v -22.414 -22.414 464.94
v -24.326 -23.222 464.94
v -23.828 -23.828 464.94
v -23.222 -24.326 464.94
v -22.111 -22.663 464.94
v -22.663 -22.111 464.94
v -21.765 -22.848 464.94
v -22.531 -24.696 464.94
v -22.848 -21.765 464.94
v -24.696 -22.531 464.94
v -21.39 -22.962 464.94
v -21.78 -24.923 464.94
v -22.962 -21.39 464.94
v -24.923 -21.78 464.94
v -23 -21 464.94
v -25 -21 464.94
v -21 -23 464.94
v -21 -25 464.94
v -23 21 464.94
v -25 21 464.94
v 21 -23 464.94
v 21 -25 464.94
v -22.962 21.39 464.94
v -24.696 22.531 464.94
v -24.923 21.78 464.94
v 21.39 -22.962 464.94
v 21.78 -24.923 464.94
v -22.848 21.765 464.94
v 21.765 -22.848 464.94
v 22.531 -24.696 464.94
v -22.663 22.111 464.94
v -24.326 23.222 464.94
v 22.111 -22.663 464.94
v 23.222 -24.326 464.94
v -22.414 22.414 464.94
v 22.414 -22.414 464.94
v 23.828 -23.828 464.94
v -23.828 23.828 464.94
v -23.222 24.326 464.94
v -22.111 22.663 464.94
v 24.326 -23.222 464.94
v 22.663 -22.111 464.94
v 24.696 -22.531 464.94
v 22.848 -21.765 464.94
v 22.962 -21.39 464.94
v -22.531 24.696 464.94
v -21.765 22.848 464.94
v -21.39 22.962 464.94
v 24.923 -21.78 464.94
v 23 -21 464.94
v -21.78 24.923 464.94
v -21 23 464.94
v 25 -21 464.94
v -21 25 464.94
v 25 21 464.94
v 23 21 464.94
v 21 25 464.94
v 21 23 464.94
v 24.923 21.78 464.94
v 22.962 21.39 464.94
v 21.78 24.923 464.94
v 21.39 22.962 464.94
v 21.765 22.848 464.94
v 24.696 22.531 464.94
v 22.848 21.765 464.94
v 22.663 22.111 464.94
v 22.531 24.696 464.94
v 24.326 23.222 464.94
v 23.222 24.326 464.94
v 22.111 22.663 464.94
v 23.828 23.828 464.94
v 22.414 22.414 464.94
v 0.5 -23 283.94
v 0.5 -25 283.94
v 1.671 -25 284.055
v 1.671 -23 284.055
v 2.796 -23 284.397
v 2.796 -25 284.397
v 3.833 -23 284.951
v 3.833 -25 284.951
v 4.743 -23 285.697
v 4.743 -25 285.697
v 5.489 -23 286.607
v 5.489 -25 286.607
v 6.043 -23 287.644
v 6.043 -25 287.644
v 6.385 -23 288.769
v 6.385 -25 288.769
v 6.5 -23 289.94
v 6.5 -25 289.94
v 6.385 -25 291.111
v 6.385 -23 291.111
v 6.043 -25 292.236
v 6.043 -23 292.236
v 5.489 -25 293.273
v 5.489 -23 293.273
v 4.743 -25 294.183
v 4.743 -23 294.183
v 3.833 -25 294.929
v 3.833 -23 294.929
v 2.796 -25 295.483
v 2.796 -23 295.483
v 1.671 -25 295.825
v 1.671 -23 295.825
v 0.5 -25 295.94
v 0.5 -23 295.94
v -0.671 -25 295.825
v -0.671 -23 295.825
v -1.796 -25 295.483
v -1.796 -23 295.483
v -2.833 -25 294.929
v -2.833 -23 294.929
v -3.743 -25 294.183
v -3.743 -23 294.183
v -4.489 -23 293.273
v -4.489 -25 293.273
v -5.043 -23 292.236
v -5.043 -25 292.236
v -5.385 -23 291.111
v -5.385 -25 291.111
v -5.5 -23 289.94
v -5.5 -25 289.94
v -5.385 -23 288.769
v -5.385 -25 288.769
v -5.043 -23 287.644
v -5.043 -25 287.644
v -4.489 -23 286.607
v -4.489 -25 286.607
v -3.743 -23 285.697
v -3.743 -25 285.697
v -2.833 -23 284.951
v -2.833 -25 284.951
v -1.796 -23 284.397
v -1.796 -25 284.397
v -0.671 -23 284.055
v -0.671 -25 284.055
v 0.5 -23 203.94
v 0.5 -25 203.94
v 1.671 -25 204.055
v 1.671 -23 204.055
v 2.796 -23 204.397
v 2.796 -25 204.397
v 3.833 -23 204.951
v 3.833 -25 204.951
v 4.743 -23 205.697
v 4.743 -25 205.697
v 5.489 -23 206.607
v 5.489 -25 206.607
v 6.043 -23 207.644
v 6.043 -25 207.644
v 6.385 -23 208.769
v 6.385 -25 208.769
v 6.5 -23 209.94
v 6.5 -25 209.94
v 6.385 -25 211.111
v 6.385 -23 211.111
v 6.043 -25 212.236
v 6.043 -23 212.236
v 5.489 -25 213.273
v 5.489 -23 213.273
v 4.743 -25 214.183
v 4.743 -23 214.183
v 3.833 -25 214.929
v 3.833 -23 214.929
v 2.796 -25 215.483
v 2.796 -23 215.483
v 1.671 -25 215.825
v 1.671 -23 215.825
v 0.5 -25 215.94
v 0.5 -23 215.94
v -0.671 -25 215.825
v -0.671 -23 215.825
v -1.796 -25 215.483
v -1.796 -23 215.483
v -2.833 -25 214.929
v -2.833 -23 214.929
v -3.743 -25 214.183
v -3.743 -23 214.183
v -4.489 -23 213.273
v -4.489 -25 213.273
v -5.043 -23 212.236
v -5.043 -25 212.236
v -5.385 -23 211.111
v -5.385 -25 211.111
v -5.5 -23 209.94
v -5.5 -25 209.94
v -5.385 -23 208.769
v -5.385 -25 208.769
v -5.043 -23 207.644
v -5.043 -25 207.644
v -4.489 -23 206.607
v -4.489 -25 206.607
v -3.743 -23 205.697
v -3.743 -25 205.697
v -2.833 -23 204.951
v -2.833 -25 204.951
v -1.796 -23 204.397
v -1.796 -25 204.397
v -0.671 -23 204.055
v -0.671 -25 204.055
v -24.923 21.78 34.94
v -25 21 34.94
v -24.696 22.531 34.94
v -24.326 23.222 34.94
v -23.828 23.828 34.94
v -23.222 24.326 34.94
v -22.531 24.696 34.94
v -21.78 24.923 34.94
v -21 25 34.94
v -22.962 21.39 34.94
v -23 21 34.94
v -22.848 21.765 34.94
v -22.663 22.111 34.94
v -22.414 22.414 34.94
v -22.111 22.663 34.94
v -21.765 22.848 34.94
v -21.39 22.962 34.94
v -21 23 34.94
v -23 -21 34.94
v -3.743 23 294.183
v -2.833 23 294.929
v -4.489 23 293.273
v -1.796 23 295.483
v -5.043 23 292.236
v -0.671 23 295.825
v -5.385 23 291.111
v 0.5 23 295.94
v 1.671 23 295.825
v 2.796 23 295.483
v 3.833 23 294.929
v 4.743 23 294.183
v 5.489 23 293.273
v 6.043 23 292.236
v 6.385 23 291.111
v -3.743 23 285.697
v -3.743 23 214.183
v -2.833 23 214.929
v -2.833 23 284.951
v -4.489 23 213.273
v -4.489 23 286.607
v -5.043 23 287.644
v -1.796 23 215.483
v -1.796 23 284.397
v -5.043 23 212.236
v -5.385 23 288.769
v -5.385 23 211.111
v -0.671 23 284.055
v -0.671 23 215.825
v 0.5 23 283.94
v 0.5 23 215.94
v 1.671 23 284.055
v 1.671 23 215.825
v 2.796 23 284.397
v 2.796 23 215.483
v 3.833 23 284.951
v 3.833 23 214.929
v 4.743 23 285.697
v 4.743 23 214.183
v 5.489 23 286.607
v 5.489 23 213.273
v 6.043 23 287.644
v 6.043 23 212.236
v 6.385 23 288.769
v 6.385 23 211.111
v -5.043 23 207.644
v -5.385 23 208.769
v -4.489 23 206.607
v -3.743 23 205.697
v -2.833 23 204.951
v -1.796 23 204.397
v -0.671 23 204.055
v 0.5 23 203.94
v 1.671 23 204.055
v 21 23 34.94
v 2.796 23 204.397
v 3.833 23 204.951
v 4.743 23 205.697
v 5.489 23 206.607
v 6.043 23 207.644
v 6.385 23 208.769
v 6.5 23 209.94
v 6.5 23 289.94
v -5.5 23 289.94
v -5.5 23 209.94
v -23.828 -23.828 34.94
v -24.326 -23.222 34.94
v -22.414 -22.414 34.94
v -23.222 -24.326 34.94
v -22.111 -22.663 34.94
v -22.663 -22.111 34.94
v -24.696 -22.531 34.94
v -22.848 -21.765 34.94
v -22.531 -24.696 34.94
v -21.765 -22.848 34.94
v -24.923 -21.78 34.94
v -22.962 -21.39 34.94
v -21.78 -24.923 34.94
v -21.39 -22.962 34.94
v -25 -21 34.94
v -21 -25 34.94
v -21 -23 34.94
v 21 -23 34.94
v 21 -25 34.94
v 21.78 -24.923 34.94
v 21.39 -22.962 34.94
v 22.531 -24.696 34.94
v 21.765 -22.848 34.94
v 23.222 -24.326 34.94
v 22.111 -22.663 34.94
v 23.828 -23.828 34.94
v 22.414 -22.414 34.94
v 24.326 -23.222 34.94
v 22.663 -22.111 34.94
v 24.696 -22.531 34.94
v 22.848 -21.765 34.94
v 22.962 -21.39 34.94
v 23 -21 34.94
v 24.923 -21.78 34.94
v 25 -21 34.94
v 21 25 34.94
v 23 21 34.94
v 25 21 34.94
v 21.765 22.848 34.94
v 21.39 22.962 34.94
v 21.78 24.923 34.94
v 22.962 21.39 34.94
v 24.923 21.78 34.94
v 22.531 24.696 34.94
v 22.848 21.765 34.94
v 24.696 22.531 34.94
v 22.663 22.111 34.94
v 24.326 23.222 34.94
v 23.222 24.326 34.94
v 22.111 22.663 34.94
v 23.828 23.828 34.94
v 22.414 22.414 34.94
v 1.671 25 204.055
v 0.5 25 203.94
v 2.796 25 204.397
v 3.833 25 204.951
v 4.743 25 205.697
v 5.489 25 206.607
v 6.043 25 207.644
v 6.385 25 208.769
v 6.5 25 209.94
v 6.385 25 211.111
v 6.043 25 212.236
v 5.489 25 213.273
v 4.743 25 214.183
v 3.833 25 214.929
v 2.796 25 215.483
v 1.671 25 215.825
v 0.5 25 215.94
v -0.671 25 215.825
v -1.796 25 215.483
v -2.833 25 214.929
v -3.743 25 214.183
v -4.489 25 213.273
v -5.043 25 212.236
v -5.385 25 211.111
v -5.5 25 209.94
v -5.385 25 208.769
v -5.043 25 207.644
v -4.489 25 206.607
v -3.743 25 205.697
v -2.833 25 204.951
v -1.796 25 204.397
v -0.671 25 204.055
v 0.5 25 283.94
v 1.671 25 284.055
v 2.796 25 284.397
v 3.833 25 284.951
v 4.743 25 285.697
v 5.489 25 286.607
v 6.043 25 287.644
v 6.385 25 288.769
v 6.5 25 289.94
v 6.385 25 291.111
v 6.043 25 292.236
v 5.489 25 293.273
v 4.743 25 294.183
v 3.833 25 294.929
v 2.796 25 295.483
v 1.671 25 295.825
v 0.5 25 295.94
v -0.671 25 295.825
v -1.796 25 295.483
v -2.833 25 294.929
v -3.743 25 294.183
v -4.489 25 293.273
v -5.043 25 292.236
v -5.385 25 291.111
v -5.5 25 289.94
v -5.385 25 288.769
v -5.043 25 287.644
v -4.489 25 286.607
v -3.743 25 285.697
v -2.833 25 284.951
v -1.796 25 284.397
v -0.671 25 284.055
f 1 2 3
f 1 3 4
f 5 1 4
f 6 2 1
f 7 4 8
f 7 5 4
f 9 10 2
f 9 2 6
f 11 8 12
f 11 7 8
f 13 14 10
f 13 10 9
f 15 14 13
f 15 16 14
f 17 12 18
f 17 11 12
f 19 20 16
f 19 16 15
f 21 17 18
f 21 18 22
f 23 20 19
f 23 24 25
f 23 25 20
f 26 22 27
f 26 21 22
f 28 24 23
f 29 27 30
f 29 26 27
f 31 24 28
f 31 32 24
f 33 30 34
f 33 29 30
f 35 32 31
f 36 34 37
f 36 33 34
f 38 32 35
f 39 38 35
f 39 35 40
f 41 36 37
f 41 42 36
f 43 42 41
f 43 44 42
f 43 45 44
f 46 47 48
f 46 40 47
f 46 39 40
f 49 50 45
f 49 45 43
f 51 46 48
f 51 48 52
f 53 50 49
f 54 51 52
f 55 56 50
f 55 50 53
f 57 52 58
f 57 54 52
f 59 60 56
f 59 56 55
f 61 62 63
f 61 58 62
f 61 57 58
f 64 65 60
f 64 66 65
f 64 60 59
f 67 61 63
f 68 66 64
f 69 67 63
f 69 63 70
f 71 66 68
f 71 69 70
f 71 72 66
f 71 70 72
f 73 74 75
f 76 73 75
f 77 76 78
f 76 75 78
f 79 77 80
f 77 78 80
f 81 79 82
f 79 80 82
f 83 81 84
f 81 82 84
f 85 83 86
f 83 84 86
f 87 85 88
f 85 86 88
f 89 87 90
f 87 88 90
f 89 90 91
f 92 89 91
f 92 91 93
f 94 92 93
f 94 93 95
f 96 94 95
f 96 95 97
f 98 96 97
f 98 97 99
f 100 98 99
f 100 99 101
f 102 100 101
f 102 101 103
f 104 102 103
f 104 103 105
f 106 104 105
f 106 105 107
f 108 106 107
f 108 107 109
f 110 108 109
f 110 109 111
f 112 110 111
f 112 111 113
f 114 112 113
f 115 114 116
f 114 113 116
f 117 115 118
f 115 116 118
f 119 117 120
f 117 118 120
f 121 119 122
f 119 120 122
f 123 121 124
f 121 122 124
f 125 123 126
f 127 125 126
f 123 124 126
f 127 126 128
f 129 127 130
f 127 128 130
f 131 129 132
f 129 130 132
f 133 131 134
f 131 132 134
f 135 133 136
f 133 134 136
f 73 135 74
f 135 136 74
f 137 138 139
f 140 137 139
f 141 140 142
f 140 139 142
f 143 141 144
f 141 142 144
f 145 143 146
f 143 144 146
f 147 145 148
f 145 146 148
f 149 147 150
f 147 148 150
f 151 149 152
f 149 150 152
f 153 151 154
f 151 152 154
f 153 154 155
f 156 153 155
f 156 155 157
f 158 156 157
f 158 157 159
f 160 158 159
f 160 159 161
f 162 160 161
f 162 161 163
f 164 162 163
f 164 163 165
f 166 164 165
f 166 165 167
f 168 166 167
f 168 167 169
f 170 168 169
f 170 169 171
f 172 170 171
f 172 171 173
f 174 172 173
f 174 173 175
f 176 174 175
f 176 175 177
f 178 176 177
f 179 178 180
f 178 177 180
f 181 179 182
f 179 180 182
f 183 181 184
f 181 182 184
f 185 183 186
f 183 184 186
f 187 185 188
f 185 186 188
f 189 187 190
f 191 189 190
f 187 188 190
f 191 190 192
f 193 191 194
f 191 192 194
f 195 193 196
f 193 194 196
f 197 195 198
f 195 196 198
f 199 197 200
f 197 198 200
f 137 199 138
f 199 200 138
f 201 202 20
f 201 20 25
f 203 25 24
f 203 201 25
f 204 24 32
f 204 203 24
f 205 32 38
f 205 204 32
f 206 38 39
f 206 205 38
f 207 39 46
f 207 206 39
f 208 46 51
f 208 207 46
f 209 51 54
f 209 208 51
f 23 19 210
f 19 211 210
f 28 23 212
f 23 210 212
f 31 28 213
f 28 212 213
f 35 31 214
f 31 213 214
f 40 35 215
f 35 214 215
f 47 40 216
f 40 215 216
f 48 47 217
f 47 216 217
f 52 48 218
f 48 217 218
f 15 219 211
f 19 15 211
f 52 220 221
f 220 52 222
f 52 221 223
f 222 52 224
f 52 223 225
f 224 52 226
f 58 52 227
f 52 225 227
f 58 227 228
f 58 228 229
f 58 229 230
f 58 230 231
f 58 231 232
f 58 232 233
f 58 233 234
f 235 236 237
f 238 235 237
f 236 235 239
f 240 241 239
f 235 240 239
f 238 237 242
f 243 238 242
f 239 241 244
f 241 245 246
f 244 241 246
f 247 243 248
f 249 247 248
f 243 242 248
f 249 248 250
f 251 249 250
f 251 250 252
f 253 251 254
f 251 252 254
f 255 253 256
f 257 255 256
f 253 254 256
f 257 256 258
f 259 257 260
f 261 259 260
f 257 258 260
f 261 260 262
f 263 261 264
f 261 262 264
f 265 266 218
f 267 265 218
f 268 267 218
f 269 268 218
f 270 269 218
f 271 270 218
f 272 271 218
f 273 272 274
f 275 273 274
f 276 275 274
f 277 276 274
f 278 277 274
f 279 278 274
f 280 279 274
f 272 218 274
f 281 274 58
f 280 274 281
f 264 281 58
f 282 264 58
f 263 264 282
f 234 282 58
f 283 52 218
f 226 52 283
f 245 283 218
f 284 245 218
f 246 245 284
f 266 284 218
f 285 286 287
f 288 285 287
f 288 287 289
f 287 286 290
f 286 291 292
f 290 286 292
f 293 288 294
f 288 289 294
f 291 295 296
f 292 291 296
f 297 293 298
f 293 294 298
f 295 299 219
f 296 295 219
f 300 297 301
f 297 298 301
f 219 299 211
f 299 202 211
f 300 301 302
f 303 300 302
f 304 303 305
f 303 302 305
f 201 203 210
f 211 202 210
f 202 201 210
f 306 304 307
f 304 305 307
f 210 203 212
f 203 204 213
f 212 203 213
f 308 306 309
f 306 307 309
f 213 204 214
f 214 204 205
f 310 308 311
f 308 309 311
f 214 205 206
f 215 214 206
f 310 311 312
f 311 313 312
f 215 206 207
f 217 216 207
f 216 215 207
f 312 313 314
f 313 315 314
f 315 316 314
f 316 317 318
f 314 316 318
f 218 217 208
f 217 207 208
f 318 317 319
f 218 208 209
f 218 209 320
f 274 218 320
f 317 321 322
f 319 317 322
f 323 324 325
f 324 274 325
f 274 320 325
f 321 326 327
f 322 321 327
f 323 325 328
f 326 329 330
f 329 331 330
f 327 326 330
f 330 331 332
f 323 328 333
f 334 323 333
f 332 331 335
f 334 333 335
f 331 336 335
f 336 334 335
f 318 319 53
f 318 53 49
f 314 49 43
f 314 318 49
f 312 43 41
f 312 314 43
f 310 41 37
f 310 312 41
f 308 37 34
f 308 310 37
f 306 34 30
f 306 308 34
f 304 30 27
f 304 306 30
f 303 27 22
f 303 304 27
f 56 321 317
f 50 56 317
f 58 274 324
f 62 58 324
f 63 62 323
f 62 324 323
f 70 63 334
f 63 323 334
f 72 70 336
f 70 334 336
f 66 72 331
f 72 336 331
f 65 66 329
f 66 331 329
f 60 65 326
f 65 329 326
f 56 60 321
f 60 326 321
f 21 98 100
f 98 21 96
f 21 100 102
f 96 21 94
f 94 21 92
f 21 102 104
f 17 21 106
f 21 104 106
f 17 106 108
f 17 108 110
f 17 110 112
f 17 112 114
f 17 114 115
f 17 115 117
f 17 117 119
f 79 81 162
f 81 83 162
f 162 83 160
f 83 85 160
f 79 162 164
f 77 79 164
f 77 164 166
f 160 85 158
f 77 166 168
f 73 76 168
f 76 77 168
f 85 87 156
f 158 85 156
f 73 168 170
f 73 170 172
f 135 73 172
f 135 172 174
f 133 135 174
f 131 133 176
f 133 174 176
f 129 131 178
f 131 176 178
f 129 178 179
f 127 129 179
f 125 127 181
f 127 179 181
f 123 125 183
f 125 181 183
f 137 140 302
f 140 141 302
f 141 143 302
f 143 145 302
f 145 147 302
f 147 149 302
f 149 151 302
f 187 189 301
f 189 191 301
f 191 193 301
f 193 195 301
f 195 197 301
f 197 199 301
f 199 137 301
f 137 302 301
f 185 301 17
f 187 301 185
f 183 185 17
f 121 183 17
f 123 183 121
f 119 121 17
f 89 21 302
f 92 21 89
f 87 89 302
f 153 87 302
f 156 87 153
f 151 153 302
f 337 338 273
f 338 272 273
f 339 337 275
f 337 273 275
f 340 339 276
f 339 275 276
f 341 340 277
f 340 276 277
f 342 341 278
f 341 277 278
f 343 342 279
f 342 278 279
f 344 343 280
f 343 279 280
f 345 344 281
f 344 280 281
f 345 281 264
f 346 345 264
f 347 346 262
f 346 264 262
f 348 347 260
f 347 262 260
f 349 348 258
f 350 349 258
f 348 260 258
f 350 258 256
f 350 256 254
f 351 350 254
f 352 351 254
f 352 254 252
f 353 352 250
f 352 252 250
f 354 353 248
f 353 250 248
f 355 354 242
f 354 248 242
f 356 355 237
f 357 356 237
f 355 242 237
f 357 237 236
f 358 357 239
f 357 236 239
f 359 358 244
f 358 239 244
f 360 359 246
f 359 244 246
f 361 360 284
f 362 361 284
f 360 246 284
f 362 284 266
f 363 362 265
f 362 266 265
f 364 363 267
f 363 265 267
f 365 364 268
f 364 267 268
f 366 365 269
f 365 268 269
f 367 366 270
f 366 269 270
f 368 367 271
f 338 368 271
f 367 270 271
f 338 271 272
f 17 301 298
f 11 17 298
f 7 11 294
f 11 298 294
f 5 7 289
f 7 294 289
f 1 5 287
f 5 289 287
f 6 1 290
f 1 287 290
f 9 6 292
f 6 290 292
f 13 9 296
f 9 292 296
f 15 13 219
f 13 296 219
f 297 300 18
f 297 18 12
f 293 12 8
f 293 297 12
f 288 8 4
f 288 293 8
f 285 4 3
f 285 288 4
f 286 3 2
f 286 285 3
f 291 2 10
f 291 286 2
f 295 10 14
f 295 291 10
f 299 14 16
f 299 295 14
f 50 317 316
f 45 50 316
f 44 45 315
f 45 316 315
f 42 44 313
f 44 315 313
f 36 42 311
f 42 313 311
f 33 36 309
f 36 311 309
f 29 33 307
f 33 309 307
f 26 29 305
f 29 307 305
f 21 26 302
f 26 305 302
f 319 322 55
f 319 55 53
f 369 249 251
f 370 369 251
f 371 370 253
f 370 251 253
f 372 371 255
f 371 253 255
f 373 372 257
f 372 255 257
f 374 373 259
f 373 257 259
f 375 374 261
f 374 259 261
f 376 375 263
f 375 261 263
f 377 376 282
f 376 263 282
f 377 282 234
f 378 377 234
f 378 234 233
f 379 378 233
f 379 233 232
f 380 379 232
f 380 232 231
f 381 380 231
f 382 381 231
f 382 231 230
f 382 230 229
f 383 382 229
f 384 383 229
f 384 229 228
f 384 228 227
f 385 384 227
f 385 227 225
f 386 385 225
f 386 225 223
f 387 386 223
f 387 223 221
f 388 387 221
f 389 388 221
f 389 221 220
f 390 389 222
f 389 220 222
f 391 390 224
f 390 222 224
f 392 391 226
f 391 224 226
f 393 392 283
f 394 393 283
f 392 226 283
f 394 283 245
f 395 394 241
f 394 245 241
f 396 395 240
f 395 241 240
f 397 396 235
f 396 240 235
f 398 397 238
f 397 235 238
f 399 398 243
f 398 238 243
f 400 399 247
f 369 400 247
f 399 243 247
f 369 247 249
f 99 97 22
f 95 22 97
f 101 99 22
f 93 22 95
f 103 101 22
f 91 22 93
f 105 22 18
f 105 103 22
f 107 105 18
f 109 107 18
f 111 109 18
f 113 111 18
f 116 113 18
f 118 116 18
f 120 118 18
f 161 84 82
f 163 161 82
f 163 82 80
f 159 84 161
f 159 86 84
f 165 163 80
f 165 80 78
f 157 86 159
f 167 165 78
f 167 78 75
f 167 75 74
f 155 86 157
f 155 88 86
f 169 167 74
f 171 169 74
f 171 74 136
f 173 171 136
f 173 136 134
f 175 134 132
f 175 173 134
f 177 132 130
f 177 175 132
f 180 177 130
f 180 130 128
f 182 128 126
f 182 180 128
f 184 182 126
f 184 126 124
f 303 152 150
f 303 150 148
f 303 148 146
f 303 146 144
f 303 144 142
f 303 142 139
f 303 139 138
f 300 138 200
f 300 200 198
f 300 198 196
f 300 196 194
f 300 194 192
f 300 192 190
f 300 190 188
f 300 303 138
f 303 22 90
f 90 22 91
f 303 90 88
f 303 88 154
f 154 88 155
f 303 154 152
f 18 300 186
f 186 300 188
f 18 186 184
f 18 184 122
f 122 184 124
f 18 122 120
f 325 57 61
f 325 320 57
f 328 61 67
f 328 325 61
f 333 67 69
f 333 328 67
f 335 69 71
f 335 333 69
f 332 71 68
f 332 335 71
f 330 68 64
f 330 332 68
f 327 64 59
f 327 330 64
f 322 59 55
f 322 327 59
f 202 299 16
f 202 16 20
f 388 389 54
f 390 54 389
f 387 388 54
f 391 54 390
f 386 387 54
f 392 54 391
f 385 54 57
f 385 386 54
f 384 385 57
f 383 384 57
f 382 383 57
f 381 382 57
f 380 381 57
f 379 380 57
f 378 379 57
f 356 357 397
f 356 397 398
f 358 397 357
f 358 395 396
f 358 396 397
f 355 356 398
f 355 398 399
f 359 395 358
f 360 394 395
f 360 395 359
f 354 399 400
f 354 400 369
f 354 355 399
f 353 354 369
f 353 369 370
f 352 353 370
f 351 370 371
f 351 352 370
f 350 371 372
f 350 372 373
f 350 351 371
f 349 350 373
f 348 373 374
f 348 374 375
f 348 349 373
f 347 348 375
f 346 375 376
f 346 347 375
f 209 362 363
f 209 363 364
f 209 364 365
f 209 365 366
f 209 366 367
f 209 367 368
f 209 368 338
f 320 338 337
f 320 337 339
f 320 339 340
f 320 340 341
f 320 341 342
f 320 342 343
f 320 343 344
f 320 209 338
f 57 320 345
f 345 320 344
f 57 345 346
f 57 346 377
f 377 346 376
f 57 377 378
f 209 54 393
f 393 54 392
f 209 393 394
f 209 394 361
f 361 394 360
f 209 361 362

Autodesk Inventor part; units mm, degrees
ref_plane "Start Plane" through (0, 0, 34.94) normal (0, 0, 1) x (1, 0, 0)
ref_plane "End Plane" through (0, 0, 464.94) normal (0, 0, 1) x (1, 0, 0)
sketch "Sketch" plane through (0, 0, 0) normal (0, 0, 1) x (1, 0, 0)
  line L0 (-25, -21) -> (-25, 21)
  line L1 (-21, 25) -> (21, 25)
  line L2 (25, 21) -> (25, -21)
  line L3 (21, -25) -> (-21, -25)
  arc A0 (-25, -21) -> (-21, -25) centre (-21, -21) ccw
  arc A1 (25, 21) -> (21, 25) centre (21, 21) ccw
  arc A2 (-21, 25) -> (-25, 21) centre (-21, 21) ccw
  arc A3 (21, -25) -> (25, -21) centre (21, -21) ccw
  arc A4 (-21, 23) -> (-23, 21) centre (-21, 21) ccw
  line L4 (-21, 23) -> (21, 23)
  arc A5 (23, 21) -> (21, 23) centre (21, 21) ccw
  line L5 (23, 21) -> (23, -21)
  arc A6 (21, -23) -> (23, -21) centre (21, -21) ccw
  line L6 (21, -23) -> (-21, -23)
  arc A7 (-23, -21) -> (-21, -23) centre (-21, -21) ccw
  line L7 (-23, -21) -> (-23, 21)
  line L8 (0, 36.1598) -> (0, -36.1598) construction
  line L9 (-36.1598, 0) -> (36.1598, 0) construction
  dimension "d7" = 4
  dimension "d9" = 50
  dimension "d11" = 50
  dimension "d12" = 2
  dimension "d15" = 25
  dimension "d16" = 25
extrude "Body" add sketch "Sketch" along normal up to surface (430 mm away) from surface at 34.94
sketch "Sketch3" plane through (0, 0, 0) normal (0, 0, 1) x (1, 0, 0)
  line L0 (0, 0) -> (10, 0)
ref_plane "Work Plane3" through (0, 0, 0) normal (0, -1, 0) x (1, 0, 0)
sketch "Sketch4" plane through (0, 0, 0) normal (0, -1, 0) x (1, 0, 0)
  line L0 (-2, 34.94) -> (12, 34.94)
  line L1 (-2, 464.94) -> (12, 464.94)
  dimension "d18" = 430
ref_plane "Work Plane4" through (1040, 29, 34.94) normal (0, 0, -1) x (-1, 0, 0)
split "Split1" plane through (1040, 29, 34.94) removes the side toward (0, 0, -1)
ref_plane "Work Plane5" through (-1270, 29, 464.94) normal (0, 0, 1) x (1, 0, 0)
split "Split2" plane through (-1270, 29, 464.94) removes the side toward (0, 0, 1)
ref_plane "Work Plane9" through (-114.5, -25, 249.94) normal (0, 1, 0) x (0, 0, -1)
sketch "Sketch5" plane through (-114.5, -25, 249.94) normal (0, 1, 0) x (0, 0, -1)
  circle A0 centre (40, -115) radius 6 projected
  circle A1 centre (-40, -115) radius 6 projected
  point P0 (249.94, -114.5)
extrude "Extrusion2" cut sketch "Sketch5" along normal through all
equation "\"d7\" = G_IR"
equation "\"d9\" = G_W"
equation "\"d11\" = G_H"
equation "\"d12\" = G_T"
equation "\"d15\" = 0.5 * d9"
equation "\"d16\" = 0.5 * d11"
equation "\"d3\" = G_L"
equation "\"G_W\" = 50"
equation "\"G_H\" = 50"
equation "\"G_T\" = 2"
equation "\"G_IR\" = 4"
equation "\"G_L\" = d18"
equation "\"G_OFFSET_START\" = -34.94003"
equation "\"G_OFFSET_END\" = -35.05997"
equation "\"d13\" = -G_OFFSET_START"
equation "\"d14\" = G_OFFSET_END + B_L"
equation "\"B_L\" = 500"
properties part number "ISO 10799-2 - 50x50x2 - 430" material "Steel, Galvanized"
